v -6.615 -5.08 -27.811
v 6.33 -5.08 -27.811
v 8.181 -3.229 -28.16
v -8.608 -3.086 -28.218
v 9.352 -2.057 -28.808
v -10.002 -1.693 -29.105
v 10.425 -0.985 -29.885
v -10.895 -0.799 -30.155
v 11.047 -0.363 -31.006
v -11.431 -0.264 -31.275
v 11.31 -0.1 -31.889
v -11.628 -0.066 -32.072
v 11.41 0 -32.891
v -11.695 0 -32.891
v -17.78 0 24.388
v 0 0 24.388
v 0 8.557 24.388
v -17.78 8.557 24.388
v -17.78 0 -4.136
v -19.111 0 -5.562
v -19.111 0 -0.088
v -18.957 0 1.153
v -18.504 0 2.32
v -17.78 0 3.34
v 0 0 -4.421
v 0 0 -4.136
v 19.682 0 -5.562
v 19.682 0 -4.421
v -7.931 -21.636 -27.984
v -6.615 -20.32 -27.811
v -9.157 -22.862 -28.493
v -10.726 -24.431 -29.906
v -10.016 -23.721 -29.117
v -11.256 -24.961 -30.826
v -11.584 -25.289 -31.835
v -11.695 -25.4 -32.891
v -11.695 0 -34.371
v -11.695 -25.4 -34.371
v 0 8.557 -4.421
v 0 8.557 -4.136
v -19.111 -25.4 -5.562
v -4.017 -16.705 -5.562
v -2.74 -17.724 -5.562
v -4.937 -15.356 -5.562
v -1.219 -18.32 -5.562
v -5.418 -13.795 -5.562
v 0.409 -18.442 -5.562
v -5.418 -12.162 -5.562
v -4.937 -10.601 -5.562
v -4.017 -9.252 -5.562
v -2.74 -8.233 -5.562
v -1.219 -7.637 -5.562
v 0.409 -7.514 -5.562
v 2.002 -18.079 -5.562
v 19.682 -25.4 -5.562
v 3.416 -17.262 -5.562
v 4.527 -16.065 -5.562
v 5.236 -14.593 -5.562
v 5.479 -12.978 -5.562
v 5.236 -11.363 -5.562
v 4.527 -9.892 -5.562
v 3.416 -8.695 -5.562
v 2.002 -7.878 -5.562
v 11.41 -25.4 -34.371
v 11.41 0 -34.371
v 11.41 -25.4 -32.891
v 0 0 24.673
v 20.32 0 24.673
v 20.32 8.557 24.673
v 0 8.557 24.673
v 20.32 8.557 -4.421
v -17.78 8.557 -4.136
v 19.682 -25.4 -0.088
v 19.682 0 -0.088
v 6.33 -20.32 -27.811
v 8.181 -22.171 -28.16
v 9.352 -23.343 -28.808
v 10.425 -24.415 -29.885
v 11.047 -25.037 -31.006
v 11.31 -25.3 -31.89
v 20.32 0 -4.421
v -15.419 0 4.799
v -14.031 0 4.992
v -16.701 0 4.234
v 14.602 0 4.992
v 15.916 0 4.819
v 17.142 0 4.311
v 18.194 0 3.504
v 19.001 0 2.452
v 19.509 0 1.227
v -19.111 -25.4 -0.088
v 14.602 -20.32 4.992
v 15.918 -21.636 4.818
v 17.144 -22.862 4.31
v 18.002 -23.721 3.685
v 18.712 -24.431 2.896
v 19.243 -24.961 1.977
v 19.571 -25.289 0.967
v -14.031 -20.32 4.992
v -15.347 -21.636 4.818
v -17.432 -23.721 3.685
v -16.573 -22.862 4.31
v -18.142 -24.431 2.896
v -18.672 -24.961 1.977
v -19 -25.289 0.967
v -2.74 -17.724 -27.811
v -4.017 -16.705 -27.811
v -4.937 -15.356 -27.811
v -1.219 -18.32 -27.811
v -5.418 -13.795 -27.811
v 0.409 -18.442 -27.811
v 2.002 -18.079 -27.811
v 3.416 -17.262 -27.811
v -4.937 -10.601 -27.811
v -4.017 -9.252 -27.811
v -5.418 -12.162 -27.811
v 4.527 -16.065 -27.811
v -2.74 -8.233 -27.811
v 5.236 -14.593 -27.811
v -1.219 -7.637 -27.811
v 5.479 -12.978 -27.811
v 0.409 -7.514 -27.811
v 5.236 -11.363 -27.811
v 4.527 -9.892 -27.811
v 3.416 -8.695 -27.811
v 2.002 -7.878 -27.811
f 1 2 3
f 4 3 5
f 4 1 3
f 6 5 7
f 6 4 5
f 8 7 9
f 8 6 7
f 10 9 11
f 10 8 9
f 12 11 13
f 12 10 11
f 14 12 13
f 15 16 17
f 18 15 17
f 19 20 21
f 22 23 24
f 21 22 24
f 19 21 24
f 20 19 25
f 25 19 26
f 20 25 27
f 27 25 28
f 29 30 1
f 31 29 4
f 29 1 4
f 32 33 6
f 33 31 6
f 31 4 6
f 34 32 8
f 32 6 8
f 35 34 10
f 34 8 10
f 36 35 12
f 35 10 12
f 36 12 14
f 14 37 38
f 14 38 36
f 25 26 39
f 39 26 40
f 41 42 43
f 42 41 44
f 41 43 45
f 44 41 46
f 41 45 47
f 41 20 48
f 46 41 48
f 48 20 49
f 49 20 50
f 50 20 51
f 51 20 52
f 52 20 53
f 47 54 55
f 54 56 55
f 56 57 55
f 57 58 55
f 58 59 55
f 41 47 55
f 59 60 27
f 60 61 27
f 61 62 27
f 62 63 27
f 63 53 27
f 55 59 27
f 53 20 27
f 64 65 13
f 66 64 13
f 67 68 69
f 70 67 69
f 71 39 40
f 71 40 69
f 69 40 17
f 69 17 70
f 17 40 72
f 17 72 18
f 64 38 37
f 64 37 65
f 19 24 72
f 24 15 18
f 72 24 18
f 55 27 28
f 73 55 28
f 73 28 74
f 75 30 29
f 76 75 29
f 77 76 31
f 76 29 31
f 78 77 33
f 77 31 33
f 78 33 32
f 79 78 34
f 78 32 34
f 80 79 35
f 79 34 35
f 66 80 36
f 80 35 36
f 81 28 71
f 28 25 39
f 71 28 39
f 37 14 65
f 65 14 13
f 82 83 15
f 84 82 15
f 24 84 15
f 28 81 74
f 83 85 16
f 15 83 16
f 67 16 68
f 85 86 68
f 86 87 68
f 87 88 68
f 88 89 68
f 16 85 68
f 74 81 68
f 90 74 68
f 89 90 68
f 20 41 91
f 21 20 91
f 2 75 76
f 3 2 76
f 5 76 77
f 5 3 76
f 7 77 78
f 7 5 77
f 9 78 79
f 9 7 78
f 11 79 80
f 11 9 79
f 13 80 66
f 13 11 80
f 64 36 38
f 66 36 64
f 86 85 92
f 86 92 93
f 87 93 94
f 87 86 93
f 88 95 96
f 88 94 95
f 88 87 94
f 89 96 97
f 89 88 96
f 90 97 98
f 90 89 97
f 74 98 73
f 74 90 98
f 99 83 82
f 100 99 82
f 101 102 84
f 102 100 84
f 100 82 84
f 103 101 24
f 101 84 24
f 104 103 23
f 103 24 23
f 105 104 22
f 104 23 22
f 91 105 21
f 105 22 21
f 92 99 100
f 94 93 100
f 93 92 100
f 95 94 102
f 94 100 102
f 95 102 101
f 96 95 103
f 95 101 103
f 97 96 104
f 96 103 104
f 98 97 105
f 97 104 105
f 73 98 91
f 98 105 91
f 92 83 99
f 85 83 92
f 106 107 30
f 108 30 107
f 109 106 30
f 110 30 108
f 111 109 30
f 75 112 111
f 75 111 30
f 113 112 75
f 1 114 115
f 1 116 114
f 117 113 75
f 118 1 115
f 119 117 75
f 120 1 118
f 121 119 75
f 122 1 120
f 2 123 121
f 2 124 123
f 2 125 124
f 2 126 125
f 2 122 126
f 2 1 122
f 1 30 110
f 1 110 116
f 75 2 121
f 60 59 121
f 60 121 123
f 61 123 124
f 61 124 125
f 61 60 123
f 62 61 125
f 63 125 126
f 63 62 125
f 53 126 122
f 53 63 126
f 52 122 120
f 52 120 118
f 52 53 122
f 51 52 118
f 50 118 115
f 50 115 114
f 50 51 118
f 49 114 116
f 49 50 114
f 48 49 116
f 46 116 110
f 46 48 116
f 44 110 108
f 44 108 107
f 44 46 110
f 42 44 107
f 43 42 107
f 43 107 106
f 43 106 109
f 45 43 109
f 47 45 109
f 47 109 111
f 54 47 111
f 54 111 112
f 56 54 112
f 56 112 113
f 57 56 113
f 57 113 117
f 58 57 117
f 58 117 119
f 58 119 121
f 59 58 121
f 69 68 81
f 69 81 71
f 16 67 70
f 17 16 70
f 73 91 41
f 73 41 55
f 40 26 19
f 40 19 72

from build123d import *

# Parameters (mm, degrees)
F0_W         = 38.7927275151
F0_H         = 10.5539034121
F1_DEPTH     = 25.4
F2_W         = 8.5572190583
F2_H         = 29.094544705
F3_DEPTH     = 20.32
F4_W         = 8.5572199896
F4_H         = 28.5240663216
F5_DEPTH     = 17.78
F6_R         = 5.4792946357
F7_DEPTH     = 27.94
F8_W         = 23.1044916436
F8_H         = 6.5605361015
F9_DEPTH     = 25.4
F10_T1_DEPTH = 64.1927275151
F10_T3_DEPTH = 38.1
F10_T5_DEPTH = 48.5044916436
F10_T7_DEPTH = 50.8


# Not quite as in the source:
# - a fillet or chamfer that OpenCascade refuses, or shapes differently, is made with other operations: its cross-section is extruded or revolved along the edge and cut away or added


with BuildPart() as f1:
    # F0 (on Front) → F1 (new body)
    with BuildSketch(Plane.XZ):
        with Locations((0.2852408215, -0.2852405887)):
            Rectangle(F0_W, F0_H)
    extrude(amount=F1_DEPTH)

    # F2 (on Right) → F3 (join)
    with BuildSketch(Plane.YZ):
        with Locations((4.2786095291, 10.1260424126)):
            Rectangle(F2_W, F2_H)
    extrude(amount=F3_DEPTH)

    # F4 (on Right) → F5 (join)
    with BuildSketch(Plane.YZ):
        with Locations((4.2786099948, 10.1260435767)):
            Rectangle(F4_W, F4_H)
    extrude(amount=-F5_DEPTH)

    # F6 (on Top) → F7 (join)
    with BuildSketch(Plane.XY):
        with Locations((0, -12.9784494638)):
            Circle(F6_R)
    extrude(amount=-F7_DEPTH)

    # F8 (on Front) → F9 (join)
    with BuildSketch(Plane.XZ):
        with Locations((-0.1426204108, -31.0912309214)):
            Rectangle(F8_W, F8_H)
    extrude(amount=F9_DEPTH)

    # F10: fillet of radius 5.08 on 7 edges, made by hand

    # F10_s2 → F10_t1 (cut)
    with BuildSketch(Plane.YZ.offset(-31.811122936)):
        with BuildLine():
            ThreePointArc((-20.32, 4.9917111173), (-23.9121024484, 3.5038135658), (-25.4, -0.0882888827))
            Line((-25.4, -0.0882888827), (-25.4, 4.9917111173))
            Line((-25.4, 4.9917111173), (-20.32, 4.9917111173))
        make_face()
    extrude(amount=F10_T1_DEPTH, mode=Mode.SUBTRACT)

    # F10_s4 → F10_t3 (cut)
    with BuildSketch(Plane.XZ):
        with BuildLine():
            ThreePointArc((-14.031122936, 4.9917111173), (-17.6232253844, 3.5038135658), (-19.111122936, -0.0882888827))
            Line((-19.111122936, -0.0882888827), (-19.111122936, 4.9917111173))
            Line((-19.111122936, 4.9917111173), (-14.031122936, 4.9917111173))
        make_face()
        with BuildLine():
            ThreePointArc((14.6016045791, 4.9917111173), (18.1937070275, 3.5038135658), (19.6816045791, -0.0882888827))
            Line((19.6816045791, -0.0882888827), (19.6816045791, 4.9917111173))
            Line((19.6816045791, 4.9917111173), (14.6016045791, 4.9917111173))
        make_face()
    extrude(amount=F10_T3_DEPTH, mode=Mode.SUBTRACT)

    # F10_s6 → F10_t5 (cut)
    with BuildSketch(Plane.YZ.offset(-24.3948662326)):
        with BuildLine():
            ThreePointArc((-20.32, -27.8109628707), (-23.9121024484, -29.2988604223), (-25.4, -32.8909628707))
            Line((-25.4, -32.8909628707), (-25.4, -27.8109628707))
            Line((-25.4, -27.8109628707), (-20.32, -27.8109628707))
        make_face()
        with BuildLine():
            ThreePointArc((-5.08, -27.8109628707), (-1.4878975516, -29.2988604223), (0, -32.8909628707))
            Line((0, -32.8909628707), (0, -27.8109628707))
            Line((0, -27.8109628707), (-5.08, -27.8109628707))
        make_face()
    extrude(amount=F10_T5_DEPTH, mode=Mode.SUBTRACT)

    # F10_s8 → F10_t7 (cut)
    with BuildSketch(Plane.XZ.offset(-12.7)):
        with BuildLine():
            ThreePointArc((6.329625411, -27.8109628707), (9.9217278595, -29.2988604223), (11.409625411, -32.8909628707))
            Line((11.409625411, -32.8909628707), (11.409625411, -27.8109628707))
            Line((11.409625411, -27.8109628707), (6.329625411, -27.8109628707))
        make_face()
        with BuildLine():
            ThreePointArc((-6.6148662326, -27.8109628707), (-10.206968681, -29.2988604223), (-11.6948662326, -32.8909628707))
            Line((-11.6948662326, -32.8909628707), (-11.6948662326, -27.8109628707))
            Line((-11.6948662326, -27.8109628707), (-6.6148662326, -27.8109628707))
        make_face()
    extrude(amount=F10_T7_DEPTH, mode=Mode.SUBTRACT)


solid = f1.part
